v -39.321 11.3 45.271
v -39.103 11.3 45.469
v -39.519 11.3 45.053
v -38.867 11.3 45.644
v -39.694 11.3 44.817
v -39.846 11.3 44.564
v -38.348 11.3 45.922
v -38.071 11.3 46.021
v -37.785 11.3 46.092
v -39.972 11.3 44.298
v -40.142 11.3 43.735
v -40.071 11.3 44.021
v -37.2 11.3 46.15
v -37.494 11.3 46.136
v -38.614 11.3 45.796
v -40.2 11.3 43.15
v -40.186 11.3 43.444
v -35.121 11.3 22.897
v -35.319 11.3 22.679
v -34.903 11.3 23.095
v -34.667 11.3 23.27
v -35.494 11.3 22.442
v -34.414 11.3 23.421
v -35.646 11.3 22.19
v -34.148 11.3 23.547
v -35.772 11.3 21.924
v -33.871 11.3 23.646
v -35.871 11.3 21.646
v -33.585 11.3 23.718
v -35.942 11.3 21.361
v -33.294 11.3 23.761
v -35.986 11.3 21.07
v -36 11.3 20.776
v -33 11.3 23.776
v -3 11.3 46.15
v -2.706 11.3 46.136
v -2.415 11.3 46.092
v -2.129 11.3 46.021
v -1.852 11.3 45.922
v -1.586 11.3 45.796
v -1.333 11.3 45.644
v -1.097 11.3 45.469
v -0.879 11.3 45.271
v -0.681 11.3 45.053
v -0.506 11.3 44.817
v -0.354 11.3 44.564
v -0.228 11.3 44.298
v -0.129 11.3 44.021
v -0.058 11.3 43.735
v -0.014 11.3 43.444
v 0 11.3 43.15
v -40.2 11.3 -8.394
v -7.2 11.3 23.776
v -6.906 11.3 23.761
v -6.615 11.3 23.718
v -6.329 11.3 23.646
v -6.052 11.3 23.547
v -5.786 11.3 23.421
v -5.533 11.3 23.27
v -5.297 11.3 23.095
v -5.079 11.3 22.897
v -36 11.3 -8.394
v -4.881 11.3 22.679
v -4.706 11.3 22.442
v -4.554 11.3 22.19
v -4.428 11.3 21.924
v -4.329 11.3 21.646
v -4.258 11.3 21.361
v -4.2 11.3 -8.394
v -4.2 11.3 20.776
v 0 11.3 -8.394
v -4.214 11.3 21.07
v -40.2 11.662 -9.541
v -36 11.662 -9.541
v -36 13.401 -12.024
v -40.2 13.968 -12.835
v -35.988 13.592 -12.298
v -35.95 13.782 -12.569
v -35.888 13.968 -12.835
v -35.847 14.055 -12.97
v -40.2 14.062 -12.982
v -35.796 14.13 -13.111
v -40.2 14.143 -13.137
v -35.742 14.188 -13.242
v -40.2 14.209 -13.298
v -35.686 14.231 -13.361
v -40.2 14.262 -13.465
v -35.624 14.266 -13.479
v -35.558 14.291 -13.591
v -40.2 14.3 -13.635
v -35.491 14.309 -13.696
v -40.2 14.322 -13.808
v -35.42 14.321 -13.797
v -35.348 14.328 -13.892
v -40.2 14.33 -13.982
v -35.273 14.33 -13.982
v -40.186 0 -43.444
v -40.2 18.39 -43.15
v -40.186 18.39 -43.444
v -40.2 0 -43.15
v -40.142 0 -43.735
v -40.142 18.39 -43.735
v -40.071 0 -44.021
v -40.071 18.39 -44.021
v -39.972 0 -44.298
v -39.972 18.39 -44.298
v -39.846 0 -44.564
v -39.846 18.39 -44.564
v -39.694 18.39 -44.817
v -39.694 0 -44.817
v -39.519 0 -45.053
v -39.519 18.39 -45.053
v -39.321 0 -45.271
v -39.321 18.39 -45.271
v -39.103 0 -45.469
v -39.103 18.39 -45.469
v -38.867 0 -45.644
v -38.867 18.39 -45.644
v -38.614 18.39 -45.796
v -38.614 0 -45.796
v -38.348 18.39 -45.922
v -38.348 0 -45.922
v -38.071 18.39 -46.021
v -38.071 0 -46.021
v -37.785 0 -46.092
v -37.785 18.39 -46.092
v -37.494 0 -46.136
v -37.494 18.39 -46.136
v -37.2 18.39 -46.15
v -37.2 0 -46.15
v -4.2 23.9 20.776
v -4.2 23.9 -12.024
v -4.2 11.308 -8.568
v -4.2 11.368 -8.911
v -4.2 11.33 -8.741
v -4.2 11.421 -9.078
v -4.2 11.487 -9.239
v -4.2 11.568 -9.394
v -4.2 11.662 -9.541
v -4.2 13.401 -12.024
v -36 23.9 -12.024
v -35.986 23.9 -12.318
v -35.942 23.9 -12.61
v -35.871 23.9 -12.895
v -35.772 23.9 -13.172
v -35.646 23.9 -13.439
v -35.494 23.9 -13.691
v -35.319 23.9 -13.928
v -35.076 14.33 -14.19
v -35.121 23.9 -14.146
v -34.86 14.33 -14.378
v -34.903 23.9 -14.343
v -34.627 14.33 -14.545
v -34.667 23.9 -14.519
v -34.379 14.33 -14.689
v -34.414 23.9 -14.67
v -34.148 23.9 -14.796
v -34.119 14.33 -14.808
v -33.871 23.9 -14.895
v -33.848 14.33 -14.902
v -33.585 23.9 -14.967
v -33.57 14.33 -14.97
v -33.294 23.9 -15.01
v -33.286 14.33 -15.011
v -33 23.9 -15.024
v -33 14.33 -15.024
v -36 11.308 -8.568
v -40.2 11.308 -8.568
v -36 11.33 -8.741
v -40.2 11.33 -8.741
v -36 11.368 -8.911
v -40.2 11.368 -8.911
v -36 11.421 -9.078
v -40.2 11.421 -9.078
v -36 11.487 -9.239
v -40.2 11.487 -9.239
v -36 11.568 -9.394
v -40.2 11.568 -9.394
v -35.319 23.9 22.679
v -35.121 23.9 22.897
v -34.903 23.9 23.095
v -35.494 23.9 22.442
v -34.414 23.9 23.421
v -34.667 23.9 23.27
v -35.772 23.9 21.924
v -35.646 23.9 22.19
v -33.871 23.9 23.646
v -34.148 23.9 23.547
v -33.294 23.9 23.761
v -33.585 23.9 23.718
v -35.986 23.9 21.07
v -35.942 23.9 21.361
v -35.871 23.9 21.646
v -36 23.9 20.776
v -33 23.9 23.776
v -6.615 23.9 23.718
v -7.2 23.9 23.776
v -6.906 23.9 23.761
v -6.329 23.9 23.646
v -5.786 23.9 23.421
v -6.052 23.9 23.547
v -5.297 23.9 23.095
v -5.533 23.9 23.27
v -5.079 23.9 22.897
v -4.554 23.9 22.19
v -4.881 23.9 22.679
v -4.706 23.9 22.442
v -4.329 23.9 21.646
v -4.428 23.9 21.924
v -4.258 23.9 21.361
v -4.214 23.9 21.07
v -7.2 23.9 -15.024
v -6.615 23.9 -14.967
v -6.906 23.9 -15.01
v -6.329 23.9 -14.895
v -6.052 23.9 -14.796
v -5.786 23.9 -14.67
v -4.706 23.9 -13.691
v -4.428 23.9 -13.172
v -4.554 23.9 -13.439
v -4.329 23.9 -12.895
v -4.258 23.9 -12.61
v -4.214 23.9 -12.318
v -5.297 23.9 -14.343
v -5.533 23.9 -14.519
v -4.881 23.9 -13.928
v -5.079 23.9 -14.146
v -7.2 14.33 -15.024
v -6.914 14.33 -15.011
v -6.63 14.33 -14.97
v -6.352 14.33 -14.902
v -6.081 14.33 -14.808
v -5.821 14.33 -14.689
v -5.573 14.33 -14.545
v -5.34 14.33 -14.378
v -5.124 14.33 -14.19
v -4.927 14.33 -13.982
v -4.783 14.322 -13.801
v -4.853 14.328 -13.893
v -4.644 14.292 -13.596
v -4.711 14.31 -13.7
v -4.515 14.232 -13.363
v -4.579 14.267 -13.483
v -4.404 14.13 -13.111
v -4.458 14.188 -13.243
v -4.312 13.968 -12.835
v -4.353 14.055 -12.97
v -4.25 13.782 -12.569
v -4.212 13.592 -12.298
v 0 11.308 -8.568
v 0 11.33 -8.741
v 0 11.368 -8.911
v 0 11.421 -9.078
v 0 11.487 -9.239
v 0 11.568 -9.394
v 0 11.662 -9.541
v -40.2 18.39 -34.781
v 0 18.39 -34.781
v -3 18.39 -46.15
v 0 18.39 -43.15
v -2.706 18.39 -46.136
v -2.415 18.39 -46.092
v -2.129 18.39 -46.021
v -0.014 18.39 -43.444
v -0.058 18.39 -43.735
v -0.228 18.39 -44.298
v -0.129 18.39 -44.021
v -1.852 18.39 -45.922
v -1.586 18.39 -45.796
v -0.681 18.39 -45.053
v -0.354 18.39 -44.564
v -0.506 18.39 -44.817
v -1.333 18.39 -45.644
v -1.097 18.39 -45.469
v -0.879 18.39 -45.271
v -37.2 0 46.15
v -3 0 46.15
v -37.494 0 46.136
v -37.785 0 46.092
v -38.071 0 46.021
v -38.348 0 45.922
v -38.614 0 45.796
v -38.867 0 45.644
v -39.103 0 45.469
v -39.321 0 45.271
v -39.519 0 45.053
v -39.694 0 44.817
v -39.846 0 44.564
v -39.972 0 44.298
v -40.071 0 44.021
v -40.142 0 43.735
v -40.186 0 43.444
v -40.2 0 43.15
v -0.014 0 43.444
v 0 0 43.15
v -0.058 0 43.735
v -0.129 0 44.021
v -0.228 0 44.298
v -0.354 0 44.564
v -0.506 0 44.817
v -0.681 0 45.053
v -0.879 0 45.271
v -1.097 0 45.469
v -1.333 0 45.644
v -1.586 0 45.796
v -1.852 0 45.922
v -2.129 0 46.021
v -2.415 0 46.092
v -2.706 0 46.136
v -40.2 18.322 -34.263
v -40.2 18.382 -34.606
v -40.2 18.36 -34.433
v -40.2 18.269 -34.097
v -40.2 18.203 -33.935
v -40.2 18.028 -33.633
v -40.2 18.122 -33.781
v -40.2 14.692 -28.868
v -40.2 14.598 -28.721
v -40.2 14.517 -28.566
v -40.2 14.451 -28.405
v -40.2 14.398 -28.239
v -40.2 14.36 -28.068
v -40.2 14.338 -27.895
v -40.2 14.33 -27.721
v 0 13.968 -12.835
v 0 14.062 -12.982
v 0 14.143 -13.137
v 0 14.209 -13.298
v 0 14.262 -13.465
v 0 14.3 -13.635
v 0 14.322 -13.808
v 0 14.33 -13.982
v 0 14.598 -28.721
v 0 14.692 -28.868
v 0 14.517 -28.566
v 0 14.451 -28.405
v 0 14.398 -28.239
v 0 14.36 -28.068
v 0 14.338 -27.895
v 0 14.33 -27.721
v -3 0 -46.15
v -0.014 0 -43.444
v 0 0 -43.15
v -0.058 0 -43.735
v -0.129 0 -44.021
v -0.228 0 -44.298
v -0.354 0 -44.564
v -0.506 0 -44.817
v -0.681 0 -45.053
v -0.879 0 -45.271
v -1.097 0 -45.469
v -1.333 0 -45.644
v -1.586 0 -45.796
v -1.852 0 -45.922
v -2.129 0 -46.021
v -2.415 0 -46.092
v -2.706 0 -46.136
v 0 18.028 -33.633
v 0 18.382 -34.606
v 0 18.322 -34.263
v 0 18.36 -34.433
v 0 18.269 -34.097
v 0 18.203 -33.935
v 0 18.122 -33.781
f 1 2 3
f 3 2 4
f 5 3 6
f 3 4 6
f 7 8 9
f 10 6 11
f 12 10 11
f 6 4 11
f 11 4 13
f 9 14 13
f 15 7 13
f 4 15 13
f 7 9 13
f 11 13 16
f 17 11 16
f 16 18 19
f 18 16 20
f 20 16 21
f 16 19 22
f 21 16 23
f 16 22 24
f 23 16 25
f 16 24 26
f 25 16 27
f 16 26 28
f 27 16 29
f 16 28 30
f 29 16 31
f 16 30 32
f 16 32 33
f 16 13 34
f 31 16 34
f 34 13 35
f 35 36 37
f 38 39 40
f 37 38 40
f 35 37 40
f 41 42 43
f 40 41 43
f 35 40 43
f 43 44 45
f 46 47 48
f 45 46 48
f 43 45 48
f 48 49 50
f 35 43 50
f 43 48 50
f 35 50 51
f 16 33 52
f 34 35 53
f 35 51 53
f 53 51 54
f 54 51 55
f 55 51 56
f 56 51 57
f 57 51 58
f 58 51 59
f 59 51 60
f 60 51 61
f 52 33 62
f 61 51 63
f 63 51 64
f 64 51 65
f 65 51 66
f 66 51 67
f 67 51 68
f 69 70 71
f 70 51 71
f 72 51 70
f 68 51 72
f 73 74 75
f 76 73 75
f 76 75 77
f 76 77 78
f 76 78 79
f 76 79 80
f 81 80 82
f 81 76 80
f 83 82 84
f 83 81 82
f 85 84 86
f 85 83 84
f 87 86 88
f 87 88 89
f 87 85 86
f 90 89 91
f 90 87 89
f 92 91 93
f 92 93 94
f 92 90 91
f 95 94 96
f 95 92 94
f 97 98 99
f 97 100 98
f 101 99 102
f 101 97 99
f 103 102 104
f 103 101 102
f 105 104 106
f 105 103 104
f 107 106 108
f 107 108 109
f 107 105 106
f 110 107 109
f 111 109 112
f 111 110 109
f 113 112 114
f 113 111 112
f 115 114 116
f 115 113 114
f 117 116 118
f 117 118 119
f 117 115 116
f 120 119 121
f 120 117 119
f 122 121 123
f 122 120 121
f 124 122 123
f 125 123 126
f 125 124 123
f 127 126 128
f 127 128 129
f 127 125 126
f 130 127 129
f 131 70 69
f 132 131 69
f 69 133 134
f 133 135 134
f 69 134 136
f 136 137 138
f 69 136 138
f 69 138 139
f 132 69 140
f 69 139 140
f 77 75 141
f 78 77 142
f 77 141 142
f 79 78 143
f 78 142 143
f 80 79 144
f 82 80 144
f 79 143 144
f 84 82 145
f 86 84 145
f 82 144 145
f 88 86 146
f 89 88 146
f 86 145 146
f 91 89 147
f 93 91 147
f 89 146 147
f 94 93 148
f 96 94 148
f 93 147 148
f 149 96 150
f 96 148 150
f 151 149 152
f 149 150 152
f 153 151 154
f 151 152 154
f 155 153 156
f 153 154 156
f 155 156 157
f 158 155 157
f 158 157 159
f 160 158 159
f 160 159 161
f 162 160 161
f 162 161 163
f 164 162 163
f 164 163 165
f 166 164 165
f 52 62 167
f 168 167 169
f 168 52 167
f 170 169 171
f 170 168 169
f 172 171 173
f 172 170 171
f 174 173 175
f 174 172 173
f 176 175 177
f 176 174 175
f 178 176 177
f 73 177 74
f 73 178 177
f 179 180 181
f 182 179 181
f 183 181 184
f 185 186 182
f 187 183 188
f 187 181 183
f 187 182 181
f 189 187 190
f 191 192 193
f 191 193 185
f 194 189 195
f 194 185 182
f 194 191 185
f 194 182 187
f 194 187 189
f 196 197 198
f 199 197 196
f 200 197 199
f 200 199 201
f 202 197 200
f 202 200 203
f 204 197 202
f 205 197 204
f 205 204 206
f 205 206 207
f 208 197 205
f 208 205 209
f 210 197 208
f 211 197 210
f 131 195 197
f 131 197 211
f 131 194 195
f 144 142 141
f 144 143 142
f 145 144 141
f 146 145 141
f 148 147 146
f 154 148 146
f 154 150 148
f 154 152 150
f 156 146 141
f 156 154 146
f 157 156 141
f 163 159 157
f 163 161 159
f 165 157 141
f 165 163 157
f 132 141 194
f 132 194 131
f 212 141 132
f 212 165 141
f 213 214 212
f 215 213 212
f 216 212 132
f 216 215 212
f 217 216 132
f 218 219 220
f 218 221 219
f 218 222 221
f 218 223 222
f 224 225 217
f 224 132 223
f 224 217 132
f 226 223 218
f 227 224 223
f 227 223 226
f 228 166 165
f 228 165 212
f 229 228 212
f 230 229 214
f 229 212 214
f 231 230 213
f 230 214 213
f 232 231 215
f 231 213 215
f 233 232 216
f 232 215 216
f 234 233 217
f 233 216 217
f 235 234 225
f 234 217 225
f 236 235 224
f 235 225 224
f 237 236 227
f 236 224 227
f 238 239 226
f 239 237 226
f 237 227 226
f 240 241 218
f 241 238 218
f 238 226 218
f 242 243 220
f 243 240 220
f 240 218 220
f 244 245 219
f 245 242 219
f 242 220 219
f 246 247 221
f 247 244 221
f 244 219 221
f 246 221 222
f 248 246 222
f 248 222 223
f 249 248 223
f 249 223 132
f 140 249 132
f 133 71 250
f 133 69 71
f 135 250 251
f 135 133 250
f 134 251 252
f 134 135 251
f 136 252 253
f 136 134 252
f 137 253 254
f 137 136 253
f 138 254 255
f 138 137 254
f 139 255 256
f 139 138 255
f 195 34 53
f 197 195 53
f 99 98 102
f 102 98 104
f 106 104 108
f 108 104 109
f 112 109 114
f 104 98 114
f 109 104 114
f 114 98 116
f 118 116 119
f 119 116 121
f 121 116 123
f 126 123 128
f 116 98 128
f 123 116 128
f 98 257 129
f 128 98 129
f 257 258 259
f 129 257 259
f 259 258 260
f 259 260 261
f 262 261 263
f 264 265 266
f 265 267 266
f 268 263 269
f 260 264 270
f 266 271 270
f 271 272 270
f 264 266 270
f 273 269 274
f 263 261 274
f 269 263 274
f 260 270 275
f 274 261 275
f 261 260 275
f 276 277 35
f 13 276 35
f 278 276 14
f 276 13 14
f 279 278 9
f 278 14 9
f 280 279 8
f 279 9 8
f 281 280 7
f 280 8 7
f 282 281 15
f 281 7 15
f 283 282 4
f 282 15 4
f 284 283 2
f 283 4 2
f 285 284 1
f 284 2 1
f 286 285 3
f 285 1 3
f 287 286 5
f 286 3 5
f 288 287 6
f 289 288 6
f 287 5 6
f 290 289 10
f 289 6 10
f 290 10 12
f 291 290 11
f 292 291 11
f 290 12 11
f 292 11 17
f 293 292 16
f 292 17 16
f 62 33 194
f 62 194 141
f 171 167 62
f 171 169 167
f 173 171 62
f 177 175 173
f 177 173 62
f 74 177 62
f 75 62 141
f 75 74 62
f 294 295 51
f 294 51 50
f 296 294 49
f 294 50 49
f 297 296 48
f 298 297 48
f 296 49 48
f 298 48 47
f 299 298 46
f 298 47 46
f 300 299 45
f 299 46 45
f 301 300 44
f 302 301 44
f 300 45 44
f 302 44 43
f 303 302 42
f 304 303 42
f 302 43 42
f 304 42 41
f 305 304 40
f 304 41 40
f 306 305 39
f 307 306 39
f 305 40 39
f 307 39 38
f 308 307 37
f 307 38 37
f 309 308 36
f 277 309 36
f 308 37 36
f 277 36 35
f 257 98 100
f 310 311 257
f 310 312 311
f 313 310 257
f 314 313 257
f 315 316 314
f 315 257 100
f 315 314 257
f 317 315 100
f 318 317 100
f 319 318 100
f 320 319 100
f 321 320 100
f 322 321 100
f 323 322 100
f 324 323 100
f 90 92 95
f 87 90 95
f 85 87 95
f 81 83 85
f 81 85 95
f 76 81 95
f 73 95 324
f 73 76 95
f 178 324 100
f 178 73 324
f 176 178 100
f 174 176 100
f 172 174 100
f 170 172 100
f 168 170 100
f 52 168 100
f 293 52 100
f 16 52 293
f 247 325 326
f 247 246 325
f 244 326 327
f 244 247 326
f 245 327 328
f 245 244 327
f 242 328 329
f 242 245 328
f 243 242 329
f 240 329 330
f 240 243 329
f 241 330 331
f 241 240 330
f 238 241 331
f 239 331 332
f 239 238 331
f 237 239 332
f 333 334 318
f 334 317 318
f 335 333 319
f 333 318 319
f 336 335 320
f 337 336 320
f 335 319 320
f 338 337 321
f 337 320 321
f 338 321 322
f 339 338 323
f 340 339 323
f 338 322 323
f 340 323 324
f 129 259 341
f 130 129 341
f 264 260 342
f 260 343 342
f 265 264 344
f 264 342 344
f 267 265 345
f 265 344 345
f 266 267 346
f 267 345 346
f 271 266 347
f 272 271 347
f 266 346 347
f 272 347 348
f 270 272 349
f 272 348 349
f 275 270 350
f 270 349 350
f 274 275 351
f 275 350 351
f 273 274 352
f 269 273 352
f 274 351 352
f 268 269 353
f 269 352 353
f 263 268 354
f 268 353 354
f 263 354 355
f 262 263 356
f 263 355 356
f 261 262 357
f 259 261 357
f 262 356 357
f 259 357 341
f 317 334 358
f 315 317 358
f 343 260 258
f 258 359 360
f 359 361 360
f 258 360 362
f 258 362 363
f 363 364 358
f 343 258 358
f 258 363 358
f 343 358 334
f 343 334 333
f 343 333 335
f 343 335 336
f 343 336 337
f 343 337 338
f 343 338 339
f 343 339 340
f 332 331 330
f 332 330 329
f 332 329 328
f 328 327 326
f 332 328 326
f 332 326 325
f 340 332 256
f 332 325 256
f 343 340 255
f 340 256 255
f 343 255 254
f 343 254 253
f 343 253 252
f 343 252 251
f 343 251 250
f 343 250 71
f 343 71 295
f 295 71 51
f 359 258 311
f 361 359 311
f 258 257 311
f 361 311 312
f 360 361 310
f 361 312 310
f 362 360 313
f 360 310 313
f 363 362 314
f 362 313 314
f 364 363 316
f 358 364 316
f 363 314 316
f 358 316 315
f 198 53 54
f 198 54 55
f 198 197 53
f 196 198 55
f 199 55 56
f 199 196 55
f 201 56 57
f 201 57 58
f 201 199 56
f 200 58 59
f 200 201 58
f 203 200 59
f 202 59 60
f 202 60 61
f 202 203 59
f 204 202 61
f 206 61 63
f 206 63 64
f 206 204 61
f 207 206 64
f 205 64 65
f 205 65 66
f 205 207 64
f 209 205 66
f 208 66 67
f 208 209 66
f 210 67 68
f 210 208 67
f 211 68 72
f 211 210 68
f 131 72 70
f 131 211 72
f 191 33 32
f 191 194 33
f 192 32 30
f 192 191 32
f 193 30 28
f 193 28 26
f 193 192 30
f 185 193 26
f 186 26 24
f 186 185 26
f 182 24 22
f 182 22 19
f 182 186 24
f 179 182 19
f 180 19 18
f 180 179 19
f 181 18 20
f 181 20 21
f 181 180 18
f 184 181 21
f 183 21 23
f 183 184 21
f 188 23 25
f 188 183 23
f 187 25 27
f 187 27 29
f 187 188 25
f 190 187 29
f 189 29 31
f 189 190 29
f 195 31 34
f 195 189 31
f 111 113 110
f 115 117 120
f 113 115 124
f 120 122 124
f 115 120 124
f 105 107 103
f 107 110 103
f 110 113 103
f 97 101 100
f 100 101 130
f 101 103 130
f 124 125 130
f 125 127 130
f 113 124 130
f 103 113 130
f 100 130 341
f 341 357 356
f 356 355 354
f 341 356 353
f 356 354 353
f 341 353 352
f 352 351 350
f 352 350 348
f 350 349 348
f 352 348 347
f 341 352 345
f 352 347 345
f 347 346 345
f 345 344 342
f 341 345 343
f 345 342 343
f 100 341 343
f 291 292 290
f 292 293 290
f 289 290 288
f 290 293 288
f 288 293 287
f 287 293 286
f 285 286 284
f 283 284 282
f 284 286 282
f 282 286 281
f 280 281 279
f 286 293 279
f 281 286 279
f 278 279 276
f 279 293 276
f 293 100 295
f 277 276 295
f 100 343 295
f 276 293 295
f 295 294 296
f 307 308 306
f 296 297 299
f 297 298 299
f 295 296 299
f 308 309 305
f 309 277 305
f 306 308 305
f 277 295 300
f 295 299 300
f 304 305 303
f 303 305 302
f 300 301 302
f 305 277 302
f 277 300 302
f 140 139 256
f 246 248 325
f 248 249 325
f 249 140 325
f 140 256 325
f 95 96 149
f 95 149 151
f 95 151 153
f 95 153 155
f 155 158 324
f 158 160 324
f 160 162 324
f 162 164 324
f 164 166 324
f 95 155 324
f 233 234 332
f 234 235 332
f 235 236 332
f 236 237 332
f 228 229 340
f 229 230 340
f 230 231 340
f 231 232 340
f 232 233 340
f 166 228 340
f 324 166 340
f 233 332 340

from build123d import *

# Parameters (mm, degrees)
BOSS_EXTRUDE1_DEPTH = 40.2
SKETCH2_W           = 31.8
SKETCH2_H           = 38.8
BOSS_EXTRUDE2_DEPTH = 12.6
FILLET1_R           = 3
FILLET2_R           = 3
FILLET3_R           = 2


with BuildPart() as part:
    # Sketch1 → Boss-Extrude1 (new body)
    with BuildSketch(Plane(origin=(0, 0, 0), x_dir=(0, 0, -1), z_dir=(1, 0, 0))):
        Polygon((46.15, 0), (-46.15, 0), (-46.15, 11.3), (9.024430632, 11.3), (13.351719093, 14.33), (28.351719093, 14.33), (34.15, 18.39), (46.15, 18.39), align=None)
    extrude(amount=-BOSS_EXTRUDE1_DEPTH)

    # Sketch2 → Boss-Extrude2 (add)
    with BuildSketch(Plane(origin=(0, 11.3, 0), x_dir=(1, 0, 0), z_dir=(0, 1, 0))):
        with Locations((-20.1, -4.375569368)):
            Rectangle(SKETCH2_W, SKETCH2_H)
    extrude(amount=BOSS_EXTRUDE2_DEPTH)

    # Fillet1
    fillet1_edges = [part.edges().sort_by_distance(p)[0] for p in [
        (-36, 19.115, -15.024430632),
        (-4.2, 19.115, -15.024430632),
        (-36, 17.6, 23.775569368),
        (-4.2, 17.6, 23.775569368),
    ]]
    fillet(fillet1_edges, radius=FILLET1_R)

    # Fillet2
    fillet2_edges = [part.edges().sort_by_distance(p)[0] for p in [
        (0, 9.195, -46.15),
        (0, 5.65, 46.15),
        (-40.2, 9.195, -46.15),
        (-40.2, 5.65, 46.15),
    ]]
    fillet(fillet2_edges, radius=FILLET2_R)

    # Fillet3
    fillet3_edges = [part.edges().sort_by_distance(p)[0] for p in [
        (-38.1, 11.3, -9.024430632),
        (-2.1, 11.3, -9.024430632),
        (-37.945204942, 14.33, -13.351719093),
        (-2.254795058, 14.33, -13.351719093),
        (-20.1, 14.33, -28.351719093),
        (-20.1, 18.39, -34.15),
    ]]
    fillet(fillet3_edges, radius=FILLET3_R)


solid = part.part
